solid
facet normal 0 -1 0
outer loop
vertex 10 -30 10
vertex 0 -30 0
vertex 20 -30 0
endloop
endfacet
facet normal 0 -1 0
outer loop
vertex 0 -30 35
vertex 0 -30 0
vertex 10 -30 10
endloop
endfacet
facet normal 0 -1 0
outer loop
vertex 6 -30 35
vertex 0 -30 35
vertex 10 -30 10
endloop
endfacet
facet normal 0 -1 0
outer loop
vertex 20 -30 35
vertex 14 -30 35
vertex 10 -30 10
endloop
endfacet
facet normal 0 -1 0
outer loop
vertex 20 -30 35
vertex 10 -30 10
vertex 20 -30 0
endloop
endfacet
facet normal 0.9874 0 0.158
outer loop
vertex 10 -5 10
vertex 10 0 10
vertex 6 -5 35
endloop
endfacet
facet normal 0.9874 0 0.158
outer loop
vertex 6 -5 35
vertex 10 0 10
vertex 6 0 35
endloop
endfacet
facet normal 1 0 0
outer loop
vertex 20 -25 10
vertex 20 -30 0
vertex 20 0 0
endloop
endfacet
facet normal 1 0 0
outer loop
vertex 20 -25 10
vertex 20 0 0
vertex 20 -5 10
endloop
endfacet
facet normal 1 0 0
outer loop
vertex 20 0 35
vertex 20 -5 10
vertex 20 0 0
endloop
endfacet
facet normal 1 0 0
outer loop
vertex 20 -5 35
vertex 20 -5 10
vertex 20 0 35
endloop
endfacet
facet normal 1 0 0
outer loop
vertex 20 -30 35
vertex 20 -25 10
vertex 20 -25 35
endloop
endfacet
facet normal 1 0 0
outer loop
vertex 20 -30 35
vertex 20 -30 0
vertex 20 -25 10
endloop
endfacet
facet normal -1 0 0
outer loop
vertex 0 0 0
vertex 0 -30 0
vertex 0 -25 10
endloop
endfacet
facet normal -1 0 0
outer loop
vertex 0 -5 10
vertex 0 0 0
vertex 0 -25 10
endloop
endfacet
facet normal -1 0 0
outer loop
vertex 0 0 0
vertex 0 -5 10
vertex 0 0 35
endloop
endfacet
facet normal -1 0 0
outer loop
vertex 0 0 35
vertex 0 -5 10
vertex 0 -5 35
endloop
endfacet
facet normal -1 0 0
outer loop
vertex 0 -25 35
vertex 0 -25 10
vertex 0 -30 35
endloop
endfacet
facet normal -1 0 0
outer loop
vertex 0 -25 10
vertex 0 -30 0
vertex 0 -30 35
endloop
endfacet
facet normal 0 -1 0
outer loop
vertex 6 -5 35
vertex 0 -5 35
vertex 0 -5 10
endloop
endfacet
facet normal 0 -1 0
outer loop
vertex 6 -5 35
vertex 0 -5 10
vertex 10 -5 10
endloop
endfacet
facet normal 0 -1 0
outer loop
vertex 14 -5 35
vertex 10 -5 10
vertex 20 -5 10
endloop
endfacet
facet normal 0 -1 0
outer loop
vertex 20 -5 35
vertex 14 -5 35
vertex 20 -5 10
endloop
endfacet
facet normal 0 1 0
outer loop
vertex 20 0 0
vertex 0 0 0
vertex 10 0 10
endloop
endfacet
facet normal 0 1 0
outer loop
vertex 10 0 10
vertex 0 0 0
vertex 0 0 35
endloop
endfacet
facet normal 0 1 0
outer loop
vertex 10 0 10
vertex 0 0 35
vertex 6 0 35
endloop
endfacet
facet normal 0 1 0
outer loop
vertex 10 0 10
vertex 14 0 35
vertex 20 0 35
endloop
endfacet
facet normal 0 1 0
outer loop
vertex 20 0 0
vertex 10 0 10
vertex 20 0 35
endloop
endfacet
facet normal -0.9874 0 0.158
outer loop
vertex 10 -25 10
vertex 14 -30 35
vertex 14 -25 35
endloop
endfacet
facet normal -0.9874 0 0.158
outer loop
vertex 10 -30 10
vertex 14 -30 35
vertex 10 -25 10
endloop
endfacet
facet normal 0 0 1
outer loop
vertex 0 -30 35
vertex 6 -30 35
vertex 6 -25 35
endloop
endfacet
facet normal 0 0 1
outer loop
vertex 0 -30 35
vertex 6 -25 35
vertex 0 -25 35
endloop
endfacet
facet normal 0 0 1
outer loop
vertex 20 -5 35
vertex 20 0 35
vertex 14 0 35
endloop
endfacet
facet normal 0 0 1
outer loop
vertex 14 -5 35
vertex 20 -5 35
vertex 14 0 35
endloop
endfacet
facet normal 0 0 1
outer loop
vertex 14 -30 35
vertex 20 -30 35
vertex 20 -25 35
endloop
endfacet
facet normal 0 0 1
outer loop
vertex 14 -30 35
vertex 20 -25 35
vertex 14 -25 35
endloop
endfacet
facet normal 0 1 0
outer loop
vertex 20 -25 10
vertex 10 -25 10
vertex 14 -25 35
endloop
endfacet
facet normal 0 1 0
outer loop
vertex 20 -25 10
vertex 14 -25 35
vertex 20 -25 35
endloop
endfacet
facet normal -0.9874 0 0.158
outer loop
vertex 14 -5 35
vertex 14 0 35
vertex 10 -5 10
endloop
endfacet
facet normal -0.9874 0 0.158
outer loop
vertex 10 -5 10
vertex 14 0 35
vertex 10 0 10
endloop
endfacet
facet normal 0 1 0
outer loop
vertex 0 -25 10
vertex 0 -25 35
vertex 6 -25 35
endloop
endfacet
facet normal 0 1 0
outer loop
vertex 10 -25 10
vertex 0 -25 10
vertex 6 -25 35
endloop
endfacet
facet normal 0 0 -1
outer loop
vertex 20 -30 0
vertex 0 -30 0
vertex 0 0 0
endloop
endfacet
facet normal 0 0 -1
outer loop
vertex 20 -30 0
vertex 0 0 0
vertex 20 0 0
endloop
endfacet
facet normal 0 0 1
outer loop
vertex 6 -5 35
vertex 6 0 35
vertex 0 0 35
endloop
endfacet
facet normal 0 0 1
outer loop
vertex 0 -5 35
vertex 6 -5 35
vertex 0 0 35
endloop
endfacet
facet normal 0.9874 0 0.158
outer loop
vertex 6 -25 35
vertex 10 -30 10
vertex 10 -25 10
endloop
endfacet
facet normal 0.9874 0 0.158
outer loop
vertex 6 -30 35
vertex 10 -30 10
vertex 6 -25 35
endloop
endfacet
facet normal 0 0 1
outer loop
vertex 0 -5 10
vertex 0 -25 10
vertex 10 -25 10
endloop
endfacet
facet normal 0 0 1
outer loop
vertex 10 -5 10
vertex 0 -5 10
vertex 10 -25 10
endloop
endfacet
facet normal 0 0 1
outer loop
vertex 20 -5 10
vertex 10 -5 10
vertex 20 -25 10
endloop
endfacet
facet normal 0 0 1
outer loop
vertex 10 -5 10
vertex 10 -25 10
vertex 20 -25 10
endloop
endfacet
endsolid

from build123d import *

# Parameters (mm, degrees)
F1_DEPTH = 5
F2_W     = 20
F2_H     = 10
F3_DEPTH = 10


with BuildPart() as f1:
    # F0 (on Front) → F1 (new body)
    with BuildSketch(Plane.XZ):
        Polygon((0, 35), (0, 0), (10, 0), (20, 0), (20, 35), (14, 35), (10, 10), (6, 35), align=None)
    extrude(amount=F1_DEPTH)

    # F2 (on face) → F3 (join)
    with BuildSketch(Plane.XZ.offset(5)):
        with Locations((10, 5)):
            Rectangle(F2_W, F2_H)
    extrude(amount=F3_DEPTH)

    # F4: F1 across face


with BuildPart() as f1_1:
    add(f1.part)
    add(f1.part.mirror(Plane(origin=(10, -15, 5), x_dir=(1, 0, 0), z_dir=(0, -1, 0))))


solid = f1_1.part
